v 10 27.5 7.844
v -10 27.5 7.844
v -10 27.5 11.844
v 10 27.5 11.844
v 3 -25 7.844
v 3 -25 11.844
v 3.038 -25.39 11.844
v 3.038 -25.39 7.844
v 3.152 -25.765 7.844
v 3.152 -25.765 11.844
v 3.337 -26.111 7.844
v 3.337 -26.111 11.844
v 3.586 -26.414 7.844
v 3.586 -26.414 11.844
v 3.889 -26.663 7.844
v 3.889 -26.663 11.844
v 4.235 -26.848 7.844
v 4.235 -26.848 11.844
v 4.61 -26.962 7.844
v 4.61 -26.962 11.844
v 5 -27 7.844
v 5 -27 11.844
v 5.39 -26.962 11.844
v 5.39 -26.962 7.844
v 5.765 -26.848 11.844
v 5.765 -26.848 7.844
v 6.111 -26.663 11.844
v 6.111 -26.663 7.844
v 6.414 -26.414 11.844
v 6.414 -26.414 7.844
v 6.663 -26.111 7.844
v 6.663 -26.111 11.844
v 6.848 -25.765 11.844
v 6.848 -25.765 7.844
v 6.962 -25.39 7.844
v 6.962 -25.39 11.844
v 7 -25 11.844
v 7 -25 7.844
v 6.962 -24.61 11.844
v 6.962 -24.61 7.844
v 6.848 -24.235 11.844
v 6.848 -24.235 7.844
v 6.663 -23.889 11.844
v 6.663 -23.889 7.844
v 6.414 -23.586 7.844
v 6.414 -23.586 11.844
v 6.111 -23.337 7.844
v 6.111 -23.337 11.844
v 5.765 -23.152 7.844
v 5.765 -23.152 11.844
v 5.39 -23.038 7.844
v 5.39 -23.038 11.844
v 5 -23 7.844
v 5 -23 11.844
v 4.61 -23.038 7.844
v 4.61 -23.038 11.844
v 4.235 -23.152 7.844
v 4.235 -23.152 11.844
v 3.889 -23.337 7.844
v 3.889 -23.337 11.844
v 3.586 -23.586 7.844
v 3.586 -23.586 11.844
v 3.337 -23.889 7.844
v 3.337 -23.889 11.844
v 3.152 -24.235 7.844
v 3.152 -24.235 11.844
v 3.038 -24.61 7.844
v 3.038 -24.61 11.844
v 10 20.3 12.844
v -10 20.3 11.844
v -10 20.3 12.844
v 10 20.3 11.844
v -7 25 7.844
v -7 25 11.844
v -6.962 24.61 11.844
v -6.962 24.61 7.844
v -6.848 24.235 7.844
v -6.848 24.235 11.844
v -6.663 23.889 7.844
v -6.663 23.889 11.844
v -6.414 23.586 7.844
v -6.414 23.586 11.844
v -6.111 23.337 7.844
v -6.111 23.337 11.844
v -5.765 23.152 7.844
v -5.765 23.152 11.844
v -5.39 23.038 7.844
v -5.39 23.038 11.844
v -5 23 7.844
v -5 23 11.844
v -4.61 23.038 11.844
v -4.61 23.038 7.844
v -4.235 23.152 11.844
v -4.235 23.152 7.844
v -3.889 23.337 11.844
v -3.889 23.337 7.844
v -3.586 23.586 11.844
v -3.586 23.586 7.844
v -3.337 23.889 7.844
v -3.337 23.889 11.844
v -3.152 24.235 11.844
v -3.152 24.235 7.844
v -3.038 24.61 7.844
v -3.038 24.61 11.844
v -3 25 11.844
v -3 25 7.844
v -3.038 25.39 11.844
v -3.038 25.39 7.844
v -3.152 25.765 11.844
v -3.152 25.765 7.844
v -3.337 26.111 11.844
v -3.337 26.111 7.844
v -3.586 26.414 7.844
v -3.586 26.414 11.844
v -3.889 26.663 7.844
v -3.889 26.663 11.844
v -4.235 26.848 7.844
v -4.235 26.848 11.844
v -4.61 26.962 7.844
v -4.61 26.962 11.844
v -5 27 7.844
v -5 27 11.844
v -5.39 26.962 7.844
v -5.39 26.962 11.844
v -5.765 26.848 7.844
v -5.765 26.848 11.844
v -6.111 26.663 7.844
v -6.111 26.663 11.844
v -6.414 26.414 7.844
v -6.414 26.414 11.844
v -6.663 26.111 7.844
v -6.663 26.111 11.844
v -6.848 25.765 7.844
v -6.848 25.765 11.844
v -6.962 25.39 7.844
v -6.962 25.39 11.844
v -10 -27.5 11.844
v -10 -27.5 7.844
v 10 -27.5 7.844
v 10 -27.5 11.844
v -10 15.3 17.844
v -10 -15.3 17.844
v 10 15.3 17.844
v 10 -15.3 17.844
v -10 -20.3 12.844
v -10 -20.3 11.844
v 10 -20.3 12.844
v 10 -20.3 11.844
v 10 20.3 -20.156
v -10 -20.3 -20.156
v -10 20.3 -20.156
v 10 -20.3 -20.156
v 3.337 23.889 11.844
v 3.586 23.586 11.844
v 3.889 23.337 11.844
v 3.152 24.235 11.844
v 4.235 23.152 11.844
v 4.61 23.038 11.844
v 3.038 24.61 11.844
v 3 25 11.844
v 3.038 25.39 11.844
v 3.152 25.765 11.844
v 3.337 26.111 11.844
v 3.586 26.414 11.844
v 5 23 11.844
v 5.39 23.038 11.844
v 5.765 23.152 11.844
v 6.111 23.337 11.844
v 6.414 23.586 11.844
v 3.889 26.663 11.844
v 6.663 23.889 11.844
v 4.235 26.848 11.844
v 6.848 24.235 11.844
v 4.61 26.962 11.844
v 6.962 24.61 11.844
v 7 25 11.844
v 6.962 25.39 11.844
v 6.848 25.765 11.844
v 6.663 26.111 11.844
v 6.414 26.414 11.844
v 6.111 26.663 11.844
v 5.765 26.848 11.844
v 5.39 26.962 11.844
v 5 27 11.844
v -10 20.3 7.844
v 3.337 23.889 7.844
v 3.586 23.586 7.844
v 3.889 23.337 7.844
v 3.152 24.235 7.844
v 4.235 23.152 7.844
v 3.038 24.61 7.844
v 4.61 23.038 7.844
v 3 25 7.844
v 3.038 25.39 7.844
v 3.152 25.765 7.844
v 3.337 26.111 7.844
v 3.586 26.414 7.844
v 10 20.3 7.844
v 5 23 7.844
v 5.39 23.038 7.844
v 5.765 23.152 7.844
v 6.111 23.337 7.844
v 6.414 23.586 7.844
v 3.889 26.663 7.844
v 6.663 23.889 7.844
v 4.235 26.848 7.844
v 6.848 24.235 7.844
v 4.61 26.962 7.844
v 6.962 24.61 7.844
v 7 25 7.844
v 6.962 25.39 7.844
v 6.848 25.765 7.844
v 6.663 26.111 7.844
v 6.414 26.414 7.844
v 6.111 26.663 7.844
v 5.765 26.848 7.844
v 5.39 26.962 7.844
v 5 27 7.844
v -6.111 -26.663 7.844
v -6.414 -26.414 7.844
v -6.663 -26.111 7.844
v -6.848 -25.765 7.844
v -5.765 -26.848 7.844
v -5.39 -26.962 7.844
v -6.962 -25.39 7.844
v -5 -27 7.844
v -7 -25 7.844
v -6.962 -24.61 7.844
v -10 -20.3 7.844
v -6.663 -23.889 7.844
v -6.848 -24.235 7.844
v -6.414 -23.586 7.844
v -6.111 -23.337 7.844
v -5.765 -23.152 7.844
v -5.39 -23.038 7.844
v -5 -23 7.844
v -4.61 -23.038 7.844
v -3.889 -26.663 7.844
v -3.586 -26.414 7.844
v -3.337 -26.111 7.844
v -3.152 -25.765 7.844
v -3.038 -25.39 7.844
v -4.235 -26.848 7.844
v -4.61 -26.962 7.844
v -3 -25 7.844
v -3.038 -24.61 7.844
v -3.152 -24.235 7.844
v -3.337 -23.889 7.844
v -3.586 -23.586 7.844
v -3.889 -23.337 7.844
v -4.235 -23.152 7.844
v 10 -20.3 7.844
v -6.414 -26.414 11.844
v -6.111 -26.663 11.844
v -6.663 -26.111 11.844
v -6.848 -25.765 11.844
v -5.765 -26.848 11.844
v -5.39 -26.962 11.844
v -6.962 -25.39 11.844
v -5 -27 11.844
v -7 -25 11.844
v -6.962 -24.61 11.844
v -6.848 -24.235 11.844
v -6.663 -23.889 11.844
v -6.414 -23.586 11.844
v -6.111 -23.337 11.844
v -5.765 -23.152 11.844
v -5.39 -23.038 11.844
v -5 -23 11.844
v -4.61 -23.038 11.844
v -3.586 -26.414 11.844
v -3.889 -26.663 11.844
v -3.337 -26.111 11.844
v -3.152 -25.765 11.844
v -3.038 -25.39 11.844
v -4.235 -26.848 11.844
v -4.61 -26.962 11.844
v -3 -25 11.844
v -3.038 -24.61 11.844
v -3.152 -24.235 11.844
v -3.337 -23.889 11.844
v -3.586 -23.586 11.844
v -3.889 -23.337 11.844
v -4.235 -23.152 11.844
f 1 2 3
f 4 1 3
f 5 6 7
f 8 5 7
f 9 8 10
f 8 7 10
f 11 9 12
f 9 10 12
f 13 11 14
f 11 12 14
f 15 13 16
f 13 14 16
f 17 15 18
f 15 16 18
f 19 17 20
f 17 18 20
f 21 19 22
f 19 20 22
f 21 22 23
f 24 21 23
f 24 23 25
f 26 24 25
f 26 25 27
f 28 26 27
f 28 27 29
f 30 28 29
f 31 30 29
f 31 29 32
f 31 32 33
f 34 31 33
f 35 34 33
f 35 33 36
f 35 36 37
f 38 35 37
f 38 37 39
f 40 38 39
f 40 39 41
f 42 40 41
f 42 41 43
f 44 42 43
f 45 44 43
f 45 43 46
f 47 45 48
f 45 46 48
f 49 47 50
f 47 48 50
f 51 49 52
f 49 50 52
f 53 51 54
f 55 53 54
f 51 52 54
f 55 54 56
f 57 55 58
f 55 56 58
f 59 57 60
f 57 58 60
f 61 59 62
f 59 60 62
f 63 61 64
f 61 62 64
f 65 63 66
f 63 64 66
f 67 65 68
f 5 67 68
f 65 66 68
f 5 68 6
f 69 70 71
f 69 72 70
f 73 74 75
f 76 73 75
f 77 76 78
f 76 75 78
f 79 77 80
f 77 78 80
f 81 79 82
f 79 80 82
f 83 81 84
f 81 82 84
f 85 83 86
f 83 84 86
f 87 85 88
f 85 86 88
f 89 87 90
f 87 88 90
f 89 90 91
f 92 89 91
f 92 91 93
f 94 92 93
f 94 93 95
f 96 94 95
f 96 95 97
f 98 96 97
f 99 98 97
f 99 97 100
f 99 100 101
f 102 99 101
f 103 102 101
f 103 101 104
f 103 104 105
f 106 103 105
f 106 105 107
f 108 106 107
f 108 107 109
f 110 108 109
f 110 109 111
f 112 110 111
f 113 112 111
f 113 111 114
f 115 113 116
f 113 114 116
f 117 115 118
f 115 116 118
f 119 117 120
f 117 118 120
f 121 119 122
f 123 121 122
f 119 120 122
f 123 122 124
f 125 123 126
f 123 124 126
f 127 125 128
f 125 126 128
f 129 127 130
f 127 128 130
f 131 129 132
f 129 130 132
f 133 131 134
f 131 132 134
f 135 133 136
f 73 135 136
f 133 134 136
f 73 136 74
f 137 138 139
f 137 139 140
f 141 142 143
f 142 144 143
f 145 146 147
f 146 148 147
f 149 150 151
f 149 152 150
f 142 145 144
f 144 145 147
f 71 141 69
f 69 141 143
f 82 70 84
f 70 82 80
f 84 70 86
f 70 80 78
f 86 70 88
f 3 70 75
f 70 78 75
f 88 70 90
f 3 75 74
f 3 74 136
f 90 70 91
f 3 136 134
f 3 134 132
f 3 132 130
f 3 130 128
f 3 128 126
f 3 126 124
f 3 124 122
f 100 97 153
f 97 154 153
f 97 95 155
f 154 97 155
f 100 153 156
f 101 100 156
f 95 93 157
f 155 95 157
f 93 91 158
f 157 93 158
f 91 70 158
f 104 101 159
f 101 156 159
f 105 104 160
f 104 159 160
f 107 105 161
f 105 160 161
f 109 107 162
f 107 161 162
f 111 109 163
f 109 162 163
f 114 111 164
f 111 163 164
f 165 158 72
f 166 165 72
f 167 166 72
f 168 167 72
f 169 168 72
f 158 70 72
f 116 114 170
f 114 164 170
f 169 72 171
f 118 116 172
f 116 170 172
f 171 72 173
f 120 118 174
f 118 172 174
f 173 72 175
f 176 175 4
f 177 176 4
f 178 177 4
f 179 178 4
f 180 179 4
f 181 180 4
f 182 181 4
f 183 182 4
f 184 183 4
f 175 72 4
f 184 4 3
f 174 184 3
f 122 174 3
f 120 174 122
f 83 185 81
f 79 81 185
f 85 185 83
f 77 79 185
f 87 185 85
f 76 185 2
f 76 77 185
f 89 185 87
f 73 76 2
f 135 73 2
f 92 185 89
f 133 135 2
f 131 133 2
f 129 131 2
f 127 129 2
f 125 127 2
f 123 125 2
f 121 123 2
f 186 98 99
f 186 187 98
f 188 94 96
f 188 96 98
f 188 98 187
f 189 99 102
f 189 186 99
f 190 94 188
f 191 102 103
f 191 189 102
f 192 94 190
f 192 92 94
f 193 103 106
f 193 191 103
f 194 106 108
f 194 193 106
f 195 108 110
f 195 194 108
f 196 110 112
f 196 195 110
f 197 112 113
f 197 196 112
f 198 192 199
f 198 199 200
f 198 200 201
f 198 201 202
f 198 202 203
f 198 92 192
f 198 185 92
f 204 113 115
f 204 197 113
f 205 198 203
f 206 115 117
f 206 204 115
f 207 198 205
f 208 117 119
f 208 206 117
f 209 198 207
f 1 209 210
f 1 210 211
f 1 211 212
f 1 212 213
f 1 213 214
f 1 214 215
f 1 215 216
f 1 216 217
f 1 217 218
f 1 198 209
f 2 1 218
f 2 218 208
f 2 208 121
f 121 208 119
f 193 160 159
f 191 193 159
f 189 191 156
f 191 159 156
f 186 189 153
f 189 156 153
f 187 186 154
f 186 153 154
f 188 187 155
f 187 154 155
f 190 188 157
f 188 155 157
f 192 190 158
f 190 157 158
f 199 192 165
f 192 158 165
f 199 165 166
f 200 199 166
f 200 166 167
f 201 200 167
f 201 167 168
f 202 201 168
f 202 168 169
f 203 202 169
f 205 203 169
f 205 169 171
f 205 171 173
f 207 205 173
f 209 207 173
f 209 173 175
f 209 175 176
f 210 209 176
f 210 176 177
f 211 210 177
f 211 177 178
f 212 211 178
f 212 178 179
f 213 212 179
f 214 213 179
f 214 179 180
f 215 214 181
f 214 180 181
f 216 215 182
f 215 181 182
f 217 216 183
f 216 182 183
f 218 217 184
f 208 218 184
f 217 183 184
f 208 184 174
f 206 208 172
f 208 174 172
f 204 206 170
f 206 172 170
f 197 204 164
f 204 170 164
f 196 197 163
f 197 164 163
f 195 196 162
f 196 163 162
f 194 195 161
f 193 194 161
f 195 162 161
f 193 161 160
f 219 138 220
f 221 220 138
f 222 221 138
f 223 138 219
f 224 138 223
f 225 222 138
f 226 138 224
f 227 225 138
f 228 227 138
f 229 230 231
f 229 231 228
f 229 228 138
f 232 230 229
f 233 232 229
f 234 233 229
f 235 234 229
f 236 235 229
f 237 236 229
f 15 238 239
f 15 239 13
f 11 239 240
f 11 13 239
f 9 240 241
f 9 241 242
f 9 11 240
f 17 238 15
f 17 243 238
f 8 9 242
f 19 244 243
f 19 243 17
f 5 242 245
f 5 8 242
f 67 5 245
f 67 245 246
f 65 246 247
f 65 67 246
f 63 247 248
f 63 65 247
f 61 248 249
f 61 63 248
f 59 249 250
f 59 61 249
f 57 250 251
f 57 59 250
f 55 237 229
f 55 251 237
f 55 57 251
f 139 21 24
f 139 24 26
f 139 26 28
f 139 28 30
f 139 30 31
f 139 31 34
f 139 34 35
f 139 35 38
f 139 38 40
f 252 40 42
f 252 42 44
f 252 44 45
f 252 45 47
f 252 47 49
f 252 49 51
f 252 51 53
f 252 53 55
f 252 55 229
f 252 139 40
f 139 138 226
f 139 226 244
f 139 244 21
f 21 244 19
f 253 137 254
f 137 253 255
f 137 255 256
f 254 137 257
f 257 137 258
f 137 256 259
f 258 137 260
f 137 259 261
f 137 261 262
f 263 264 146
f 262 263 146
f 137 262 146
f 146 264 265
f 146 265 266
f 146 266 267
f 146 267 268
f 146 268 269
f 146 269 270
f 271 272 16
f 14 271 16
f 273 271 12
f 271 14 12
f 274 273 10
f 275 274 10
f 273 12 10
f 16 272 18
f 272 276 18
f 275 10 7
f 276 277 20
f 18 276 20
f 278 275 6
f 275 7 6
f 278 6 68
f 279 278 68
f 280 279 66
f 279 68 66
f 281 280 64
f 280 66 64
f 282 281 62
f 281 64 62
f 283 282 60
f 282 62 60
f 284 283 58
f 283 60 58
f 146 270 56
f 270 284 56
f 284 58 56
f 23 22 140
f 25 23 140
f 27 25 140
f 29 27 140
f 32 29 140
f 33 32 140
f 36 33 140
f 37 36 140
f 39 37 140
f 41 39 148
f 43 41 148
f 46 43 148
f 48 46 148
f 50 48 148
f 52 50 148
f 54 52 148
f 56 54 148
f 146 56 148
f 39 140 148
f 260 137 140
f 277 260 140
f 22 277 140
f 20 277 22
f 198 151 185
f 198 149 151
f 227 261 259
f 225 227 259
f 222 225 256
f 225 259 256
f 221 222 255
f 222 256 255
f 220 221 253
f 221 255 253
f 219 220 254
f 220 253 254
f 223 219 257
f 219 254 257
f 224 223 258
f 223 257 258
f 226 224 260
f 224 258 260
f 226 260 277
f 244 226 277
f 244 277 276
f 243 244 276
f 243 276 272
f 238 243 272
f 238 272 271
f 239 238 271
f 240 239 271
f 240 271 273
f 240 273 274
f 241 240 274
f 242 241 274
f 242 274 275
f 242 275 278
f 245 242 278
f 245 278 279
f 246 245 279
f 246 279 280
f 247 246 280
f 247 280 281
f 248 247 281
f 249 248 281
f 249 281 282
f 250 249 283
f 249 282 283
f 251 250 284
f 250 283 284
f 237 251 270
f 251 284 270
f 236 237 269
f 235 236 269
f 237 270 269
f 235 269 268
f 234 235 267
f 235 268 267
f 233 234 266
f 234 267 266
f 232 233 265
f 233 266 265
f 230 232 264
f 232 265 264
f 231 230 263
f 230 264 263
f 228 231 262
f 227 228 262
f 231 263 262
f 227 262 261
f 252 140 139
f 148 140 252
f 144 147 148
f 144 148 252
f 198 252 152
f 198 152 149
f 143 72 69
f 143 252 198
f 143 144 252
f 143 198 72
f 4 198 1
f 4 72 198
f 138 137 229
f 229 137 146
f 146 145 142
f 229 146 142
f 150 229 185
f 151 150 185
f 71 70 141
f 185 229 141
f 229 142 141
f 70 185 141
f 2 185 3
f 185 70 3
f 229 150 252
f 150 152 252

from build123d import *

# Parameters (mm, degrees)
F0_W     = 7.2
F0_H     = 4
F0_W_2   = 40.6
F0_H_2   = 6
F0_H_3   = 28
F1_DEPTH = 10
F3_D     = 4
F4_SIZE  = 5


# Not quite as in the source:
# - the program builds the solid bodies; features that only make, move or delete a surface that nothing else refers to are left out


with BuildPart() as f1:
    # F0 (on Right) → F1 (new body, symmetric)
    with BuildSketch(Plane.YZ):
        with Locations((23.9, 9.8437508568)):
            Rectangle(F0_W, F0_H)
        with Locations((0, 14.8437508568)):
            Rectangle(F0_W_2, F0_H_2)
        with Locations((0, -6.1562491432)):
            Rectangle(F0_W_2, F0_H_3)
        with Locations((-23.9, 9.8437508568)):
            Rectangle(F0_W, F0_H)
        with Locations((0, 9.8437508568)):
            Rectangle(F0_W_2, F0_H)
    extrude(amount=F1_DEPTH, both=True)

    # F3 (through all)
    with Locations(Plane(origin=(0, 0, 0), x_dir=(1, 0, 0), z_dir=(0, 0, -1))):
        with Locations((-5, -25), (5, -25), (5, 25), (-5, 25)):
            Hole(F3_D / 2)

    # F4
    f4_edges = [f1.edges().sort_by_distance(p)[0] for p in [
        (0, -20.3, 17.843751),
        (0, 20.3, 17.843751),
    ]]
    chamfer(f4_edges, length=F4_SIZE)


solid = f1.part
